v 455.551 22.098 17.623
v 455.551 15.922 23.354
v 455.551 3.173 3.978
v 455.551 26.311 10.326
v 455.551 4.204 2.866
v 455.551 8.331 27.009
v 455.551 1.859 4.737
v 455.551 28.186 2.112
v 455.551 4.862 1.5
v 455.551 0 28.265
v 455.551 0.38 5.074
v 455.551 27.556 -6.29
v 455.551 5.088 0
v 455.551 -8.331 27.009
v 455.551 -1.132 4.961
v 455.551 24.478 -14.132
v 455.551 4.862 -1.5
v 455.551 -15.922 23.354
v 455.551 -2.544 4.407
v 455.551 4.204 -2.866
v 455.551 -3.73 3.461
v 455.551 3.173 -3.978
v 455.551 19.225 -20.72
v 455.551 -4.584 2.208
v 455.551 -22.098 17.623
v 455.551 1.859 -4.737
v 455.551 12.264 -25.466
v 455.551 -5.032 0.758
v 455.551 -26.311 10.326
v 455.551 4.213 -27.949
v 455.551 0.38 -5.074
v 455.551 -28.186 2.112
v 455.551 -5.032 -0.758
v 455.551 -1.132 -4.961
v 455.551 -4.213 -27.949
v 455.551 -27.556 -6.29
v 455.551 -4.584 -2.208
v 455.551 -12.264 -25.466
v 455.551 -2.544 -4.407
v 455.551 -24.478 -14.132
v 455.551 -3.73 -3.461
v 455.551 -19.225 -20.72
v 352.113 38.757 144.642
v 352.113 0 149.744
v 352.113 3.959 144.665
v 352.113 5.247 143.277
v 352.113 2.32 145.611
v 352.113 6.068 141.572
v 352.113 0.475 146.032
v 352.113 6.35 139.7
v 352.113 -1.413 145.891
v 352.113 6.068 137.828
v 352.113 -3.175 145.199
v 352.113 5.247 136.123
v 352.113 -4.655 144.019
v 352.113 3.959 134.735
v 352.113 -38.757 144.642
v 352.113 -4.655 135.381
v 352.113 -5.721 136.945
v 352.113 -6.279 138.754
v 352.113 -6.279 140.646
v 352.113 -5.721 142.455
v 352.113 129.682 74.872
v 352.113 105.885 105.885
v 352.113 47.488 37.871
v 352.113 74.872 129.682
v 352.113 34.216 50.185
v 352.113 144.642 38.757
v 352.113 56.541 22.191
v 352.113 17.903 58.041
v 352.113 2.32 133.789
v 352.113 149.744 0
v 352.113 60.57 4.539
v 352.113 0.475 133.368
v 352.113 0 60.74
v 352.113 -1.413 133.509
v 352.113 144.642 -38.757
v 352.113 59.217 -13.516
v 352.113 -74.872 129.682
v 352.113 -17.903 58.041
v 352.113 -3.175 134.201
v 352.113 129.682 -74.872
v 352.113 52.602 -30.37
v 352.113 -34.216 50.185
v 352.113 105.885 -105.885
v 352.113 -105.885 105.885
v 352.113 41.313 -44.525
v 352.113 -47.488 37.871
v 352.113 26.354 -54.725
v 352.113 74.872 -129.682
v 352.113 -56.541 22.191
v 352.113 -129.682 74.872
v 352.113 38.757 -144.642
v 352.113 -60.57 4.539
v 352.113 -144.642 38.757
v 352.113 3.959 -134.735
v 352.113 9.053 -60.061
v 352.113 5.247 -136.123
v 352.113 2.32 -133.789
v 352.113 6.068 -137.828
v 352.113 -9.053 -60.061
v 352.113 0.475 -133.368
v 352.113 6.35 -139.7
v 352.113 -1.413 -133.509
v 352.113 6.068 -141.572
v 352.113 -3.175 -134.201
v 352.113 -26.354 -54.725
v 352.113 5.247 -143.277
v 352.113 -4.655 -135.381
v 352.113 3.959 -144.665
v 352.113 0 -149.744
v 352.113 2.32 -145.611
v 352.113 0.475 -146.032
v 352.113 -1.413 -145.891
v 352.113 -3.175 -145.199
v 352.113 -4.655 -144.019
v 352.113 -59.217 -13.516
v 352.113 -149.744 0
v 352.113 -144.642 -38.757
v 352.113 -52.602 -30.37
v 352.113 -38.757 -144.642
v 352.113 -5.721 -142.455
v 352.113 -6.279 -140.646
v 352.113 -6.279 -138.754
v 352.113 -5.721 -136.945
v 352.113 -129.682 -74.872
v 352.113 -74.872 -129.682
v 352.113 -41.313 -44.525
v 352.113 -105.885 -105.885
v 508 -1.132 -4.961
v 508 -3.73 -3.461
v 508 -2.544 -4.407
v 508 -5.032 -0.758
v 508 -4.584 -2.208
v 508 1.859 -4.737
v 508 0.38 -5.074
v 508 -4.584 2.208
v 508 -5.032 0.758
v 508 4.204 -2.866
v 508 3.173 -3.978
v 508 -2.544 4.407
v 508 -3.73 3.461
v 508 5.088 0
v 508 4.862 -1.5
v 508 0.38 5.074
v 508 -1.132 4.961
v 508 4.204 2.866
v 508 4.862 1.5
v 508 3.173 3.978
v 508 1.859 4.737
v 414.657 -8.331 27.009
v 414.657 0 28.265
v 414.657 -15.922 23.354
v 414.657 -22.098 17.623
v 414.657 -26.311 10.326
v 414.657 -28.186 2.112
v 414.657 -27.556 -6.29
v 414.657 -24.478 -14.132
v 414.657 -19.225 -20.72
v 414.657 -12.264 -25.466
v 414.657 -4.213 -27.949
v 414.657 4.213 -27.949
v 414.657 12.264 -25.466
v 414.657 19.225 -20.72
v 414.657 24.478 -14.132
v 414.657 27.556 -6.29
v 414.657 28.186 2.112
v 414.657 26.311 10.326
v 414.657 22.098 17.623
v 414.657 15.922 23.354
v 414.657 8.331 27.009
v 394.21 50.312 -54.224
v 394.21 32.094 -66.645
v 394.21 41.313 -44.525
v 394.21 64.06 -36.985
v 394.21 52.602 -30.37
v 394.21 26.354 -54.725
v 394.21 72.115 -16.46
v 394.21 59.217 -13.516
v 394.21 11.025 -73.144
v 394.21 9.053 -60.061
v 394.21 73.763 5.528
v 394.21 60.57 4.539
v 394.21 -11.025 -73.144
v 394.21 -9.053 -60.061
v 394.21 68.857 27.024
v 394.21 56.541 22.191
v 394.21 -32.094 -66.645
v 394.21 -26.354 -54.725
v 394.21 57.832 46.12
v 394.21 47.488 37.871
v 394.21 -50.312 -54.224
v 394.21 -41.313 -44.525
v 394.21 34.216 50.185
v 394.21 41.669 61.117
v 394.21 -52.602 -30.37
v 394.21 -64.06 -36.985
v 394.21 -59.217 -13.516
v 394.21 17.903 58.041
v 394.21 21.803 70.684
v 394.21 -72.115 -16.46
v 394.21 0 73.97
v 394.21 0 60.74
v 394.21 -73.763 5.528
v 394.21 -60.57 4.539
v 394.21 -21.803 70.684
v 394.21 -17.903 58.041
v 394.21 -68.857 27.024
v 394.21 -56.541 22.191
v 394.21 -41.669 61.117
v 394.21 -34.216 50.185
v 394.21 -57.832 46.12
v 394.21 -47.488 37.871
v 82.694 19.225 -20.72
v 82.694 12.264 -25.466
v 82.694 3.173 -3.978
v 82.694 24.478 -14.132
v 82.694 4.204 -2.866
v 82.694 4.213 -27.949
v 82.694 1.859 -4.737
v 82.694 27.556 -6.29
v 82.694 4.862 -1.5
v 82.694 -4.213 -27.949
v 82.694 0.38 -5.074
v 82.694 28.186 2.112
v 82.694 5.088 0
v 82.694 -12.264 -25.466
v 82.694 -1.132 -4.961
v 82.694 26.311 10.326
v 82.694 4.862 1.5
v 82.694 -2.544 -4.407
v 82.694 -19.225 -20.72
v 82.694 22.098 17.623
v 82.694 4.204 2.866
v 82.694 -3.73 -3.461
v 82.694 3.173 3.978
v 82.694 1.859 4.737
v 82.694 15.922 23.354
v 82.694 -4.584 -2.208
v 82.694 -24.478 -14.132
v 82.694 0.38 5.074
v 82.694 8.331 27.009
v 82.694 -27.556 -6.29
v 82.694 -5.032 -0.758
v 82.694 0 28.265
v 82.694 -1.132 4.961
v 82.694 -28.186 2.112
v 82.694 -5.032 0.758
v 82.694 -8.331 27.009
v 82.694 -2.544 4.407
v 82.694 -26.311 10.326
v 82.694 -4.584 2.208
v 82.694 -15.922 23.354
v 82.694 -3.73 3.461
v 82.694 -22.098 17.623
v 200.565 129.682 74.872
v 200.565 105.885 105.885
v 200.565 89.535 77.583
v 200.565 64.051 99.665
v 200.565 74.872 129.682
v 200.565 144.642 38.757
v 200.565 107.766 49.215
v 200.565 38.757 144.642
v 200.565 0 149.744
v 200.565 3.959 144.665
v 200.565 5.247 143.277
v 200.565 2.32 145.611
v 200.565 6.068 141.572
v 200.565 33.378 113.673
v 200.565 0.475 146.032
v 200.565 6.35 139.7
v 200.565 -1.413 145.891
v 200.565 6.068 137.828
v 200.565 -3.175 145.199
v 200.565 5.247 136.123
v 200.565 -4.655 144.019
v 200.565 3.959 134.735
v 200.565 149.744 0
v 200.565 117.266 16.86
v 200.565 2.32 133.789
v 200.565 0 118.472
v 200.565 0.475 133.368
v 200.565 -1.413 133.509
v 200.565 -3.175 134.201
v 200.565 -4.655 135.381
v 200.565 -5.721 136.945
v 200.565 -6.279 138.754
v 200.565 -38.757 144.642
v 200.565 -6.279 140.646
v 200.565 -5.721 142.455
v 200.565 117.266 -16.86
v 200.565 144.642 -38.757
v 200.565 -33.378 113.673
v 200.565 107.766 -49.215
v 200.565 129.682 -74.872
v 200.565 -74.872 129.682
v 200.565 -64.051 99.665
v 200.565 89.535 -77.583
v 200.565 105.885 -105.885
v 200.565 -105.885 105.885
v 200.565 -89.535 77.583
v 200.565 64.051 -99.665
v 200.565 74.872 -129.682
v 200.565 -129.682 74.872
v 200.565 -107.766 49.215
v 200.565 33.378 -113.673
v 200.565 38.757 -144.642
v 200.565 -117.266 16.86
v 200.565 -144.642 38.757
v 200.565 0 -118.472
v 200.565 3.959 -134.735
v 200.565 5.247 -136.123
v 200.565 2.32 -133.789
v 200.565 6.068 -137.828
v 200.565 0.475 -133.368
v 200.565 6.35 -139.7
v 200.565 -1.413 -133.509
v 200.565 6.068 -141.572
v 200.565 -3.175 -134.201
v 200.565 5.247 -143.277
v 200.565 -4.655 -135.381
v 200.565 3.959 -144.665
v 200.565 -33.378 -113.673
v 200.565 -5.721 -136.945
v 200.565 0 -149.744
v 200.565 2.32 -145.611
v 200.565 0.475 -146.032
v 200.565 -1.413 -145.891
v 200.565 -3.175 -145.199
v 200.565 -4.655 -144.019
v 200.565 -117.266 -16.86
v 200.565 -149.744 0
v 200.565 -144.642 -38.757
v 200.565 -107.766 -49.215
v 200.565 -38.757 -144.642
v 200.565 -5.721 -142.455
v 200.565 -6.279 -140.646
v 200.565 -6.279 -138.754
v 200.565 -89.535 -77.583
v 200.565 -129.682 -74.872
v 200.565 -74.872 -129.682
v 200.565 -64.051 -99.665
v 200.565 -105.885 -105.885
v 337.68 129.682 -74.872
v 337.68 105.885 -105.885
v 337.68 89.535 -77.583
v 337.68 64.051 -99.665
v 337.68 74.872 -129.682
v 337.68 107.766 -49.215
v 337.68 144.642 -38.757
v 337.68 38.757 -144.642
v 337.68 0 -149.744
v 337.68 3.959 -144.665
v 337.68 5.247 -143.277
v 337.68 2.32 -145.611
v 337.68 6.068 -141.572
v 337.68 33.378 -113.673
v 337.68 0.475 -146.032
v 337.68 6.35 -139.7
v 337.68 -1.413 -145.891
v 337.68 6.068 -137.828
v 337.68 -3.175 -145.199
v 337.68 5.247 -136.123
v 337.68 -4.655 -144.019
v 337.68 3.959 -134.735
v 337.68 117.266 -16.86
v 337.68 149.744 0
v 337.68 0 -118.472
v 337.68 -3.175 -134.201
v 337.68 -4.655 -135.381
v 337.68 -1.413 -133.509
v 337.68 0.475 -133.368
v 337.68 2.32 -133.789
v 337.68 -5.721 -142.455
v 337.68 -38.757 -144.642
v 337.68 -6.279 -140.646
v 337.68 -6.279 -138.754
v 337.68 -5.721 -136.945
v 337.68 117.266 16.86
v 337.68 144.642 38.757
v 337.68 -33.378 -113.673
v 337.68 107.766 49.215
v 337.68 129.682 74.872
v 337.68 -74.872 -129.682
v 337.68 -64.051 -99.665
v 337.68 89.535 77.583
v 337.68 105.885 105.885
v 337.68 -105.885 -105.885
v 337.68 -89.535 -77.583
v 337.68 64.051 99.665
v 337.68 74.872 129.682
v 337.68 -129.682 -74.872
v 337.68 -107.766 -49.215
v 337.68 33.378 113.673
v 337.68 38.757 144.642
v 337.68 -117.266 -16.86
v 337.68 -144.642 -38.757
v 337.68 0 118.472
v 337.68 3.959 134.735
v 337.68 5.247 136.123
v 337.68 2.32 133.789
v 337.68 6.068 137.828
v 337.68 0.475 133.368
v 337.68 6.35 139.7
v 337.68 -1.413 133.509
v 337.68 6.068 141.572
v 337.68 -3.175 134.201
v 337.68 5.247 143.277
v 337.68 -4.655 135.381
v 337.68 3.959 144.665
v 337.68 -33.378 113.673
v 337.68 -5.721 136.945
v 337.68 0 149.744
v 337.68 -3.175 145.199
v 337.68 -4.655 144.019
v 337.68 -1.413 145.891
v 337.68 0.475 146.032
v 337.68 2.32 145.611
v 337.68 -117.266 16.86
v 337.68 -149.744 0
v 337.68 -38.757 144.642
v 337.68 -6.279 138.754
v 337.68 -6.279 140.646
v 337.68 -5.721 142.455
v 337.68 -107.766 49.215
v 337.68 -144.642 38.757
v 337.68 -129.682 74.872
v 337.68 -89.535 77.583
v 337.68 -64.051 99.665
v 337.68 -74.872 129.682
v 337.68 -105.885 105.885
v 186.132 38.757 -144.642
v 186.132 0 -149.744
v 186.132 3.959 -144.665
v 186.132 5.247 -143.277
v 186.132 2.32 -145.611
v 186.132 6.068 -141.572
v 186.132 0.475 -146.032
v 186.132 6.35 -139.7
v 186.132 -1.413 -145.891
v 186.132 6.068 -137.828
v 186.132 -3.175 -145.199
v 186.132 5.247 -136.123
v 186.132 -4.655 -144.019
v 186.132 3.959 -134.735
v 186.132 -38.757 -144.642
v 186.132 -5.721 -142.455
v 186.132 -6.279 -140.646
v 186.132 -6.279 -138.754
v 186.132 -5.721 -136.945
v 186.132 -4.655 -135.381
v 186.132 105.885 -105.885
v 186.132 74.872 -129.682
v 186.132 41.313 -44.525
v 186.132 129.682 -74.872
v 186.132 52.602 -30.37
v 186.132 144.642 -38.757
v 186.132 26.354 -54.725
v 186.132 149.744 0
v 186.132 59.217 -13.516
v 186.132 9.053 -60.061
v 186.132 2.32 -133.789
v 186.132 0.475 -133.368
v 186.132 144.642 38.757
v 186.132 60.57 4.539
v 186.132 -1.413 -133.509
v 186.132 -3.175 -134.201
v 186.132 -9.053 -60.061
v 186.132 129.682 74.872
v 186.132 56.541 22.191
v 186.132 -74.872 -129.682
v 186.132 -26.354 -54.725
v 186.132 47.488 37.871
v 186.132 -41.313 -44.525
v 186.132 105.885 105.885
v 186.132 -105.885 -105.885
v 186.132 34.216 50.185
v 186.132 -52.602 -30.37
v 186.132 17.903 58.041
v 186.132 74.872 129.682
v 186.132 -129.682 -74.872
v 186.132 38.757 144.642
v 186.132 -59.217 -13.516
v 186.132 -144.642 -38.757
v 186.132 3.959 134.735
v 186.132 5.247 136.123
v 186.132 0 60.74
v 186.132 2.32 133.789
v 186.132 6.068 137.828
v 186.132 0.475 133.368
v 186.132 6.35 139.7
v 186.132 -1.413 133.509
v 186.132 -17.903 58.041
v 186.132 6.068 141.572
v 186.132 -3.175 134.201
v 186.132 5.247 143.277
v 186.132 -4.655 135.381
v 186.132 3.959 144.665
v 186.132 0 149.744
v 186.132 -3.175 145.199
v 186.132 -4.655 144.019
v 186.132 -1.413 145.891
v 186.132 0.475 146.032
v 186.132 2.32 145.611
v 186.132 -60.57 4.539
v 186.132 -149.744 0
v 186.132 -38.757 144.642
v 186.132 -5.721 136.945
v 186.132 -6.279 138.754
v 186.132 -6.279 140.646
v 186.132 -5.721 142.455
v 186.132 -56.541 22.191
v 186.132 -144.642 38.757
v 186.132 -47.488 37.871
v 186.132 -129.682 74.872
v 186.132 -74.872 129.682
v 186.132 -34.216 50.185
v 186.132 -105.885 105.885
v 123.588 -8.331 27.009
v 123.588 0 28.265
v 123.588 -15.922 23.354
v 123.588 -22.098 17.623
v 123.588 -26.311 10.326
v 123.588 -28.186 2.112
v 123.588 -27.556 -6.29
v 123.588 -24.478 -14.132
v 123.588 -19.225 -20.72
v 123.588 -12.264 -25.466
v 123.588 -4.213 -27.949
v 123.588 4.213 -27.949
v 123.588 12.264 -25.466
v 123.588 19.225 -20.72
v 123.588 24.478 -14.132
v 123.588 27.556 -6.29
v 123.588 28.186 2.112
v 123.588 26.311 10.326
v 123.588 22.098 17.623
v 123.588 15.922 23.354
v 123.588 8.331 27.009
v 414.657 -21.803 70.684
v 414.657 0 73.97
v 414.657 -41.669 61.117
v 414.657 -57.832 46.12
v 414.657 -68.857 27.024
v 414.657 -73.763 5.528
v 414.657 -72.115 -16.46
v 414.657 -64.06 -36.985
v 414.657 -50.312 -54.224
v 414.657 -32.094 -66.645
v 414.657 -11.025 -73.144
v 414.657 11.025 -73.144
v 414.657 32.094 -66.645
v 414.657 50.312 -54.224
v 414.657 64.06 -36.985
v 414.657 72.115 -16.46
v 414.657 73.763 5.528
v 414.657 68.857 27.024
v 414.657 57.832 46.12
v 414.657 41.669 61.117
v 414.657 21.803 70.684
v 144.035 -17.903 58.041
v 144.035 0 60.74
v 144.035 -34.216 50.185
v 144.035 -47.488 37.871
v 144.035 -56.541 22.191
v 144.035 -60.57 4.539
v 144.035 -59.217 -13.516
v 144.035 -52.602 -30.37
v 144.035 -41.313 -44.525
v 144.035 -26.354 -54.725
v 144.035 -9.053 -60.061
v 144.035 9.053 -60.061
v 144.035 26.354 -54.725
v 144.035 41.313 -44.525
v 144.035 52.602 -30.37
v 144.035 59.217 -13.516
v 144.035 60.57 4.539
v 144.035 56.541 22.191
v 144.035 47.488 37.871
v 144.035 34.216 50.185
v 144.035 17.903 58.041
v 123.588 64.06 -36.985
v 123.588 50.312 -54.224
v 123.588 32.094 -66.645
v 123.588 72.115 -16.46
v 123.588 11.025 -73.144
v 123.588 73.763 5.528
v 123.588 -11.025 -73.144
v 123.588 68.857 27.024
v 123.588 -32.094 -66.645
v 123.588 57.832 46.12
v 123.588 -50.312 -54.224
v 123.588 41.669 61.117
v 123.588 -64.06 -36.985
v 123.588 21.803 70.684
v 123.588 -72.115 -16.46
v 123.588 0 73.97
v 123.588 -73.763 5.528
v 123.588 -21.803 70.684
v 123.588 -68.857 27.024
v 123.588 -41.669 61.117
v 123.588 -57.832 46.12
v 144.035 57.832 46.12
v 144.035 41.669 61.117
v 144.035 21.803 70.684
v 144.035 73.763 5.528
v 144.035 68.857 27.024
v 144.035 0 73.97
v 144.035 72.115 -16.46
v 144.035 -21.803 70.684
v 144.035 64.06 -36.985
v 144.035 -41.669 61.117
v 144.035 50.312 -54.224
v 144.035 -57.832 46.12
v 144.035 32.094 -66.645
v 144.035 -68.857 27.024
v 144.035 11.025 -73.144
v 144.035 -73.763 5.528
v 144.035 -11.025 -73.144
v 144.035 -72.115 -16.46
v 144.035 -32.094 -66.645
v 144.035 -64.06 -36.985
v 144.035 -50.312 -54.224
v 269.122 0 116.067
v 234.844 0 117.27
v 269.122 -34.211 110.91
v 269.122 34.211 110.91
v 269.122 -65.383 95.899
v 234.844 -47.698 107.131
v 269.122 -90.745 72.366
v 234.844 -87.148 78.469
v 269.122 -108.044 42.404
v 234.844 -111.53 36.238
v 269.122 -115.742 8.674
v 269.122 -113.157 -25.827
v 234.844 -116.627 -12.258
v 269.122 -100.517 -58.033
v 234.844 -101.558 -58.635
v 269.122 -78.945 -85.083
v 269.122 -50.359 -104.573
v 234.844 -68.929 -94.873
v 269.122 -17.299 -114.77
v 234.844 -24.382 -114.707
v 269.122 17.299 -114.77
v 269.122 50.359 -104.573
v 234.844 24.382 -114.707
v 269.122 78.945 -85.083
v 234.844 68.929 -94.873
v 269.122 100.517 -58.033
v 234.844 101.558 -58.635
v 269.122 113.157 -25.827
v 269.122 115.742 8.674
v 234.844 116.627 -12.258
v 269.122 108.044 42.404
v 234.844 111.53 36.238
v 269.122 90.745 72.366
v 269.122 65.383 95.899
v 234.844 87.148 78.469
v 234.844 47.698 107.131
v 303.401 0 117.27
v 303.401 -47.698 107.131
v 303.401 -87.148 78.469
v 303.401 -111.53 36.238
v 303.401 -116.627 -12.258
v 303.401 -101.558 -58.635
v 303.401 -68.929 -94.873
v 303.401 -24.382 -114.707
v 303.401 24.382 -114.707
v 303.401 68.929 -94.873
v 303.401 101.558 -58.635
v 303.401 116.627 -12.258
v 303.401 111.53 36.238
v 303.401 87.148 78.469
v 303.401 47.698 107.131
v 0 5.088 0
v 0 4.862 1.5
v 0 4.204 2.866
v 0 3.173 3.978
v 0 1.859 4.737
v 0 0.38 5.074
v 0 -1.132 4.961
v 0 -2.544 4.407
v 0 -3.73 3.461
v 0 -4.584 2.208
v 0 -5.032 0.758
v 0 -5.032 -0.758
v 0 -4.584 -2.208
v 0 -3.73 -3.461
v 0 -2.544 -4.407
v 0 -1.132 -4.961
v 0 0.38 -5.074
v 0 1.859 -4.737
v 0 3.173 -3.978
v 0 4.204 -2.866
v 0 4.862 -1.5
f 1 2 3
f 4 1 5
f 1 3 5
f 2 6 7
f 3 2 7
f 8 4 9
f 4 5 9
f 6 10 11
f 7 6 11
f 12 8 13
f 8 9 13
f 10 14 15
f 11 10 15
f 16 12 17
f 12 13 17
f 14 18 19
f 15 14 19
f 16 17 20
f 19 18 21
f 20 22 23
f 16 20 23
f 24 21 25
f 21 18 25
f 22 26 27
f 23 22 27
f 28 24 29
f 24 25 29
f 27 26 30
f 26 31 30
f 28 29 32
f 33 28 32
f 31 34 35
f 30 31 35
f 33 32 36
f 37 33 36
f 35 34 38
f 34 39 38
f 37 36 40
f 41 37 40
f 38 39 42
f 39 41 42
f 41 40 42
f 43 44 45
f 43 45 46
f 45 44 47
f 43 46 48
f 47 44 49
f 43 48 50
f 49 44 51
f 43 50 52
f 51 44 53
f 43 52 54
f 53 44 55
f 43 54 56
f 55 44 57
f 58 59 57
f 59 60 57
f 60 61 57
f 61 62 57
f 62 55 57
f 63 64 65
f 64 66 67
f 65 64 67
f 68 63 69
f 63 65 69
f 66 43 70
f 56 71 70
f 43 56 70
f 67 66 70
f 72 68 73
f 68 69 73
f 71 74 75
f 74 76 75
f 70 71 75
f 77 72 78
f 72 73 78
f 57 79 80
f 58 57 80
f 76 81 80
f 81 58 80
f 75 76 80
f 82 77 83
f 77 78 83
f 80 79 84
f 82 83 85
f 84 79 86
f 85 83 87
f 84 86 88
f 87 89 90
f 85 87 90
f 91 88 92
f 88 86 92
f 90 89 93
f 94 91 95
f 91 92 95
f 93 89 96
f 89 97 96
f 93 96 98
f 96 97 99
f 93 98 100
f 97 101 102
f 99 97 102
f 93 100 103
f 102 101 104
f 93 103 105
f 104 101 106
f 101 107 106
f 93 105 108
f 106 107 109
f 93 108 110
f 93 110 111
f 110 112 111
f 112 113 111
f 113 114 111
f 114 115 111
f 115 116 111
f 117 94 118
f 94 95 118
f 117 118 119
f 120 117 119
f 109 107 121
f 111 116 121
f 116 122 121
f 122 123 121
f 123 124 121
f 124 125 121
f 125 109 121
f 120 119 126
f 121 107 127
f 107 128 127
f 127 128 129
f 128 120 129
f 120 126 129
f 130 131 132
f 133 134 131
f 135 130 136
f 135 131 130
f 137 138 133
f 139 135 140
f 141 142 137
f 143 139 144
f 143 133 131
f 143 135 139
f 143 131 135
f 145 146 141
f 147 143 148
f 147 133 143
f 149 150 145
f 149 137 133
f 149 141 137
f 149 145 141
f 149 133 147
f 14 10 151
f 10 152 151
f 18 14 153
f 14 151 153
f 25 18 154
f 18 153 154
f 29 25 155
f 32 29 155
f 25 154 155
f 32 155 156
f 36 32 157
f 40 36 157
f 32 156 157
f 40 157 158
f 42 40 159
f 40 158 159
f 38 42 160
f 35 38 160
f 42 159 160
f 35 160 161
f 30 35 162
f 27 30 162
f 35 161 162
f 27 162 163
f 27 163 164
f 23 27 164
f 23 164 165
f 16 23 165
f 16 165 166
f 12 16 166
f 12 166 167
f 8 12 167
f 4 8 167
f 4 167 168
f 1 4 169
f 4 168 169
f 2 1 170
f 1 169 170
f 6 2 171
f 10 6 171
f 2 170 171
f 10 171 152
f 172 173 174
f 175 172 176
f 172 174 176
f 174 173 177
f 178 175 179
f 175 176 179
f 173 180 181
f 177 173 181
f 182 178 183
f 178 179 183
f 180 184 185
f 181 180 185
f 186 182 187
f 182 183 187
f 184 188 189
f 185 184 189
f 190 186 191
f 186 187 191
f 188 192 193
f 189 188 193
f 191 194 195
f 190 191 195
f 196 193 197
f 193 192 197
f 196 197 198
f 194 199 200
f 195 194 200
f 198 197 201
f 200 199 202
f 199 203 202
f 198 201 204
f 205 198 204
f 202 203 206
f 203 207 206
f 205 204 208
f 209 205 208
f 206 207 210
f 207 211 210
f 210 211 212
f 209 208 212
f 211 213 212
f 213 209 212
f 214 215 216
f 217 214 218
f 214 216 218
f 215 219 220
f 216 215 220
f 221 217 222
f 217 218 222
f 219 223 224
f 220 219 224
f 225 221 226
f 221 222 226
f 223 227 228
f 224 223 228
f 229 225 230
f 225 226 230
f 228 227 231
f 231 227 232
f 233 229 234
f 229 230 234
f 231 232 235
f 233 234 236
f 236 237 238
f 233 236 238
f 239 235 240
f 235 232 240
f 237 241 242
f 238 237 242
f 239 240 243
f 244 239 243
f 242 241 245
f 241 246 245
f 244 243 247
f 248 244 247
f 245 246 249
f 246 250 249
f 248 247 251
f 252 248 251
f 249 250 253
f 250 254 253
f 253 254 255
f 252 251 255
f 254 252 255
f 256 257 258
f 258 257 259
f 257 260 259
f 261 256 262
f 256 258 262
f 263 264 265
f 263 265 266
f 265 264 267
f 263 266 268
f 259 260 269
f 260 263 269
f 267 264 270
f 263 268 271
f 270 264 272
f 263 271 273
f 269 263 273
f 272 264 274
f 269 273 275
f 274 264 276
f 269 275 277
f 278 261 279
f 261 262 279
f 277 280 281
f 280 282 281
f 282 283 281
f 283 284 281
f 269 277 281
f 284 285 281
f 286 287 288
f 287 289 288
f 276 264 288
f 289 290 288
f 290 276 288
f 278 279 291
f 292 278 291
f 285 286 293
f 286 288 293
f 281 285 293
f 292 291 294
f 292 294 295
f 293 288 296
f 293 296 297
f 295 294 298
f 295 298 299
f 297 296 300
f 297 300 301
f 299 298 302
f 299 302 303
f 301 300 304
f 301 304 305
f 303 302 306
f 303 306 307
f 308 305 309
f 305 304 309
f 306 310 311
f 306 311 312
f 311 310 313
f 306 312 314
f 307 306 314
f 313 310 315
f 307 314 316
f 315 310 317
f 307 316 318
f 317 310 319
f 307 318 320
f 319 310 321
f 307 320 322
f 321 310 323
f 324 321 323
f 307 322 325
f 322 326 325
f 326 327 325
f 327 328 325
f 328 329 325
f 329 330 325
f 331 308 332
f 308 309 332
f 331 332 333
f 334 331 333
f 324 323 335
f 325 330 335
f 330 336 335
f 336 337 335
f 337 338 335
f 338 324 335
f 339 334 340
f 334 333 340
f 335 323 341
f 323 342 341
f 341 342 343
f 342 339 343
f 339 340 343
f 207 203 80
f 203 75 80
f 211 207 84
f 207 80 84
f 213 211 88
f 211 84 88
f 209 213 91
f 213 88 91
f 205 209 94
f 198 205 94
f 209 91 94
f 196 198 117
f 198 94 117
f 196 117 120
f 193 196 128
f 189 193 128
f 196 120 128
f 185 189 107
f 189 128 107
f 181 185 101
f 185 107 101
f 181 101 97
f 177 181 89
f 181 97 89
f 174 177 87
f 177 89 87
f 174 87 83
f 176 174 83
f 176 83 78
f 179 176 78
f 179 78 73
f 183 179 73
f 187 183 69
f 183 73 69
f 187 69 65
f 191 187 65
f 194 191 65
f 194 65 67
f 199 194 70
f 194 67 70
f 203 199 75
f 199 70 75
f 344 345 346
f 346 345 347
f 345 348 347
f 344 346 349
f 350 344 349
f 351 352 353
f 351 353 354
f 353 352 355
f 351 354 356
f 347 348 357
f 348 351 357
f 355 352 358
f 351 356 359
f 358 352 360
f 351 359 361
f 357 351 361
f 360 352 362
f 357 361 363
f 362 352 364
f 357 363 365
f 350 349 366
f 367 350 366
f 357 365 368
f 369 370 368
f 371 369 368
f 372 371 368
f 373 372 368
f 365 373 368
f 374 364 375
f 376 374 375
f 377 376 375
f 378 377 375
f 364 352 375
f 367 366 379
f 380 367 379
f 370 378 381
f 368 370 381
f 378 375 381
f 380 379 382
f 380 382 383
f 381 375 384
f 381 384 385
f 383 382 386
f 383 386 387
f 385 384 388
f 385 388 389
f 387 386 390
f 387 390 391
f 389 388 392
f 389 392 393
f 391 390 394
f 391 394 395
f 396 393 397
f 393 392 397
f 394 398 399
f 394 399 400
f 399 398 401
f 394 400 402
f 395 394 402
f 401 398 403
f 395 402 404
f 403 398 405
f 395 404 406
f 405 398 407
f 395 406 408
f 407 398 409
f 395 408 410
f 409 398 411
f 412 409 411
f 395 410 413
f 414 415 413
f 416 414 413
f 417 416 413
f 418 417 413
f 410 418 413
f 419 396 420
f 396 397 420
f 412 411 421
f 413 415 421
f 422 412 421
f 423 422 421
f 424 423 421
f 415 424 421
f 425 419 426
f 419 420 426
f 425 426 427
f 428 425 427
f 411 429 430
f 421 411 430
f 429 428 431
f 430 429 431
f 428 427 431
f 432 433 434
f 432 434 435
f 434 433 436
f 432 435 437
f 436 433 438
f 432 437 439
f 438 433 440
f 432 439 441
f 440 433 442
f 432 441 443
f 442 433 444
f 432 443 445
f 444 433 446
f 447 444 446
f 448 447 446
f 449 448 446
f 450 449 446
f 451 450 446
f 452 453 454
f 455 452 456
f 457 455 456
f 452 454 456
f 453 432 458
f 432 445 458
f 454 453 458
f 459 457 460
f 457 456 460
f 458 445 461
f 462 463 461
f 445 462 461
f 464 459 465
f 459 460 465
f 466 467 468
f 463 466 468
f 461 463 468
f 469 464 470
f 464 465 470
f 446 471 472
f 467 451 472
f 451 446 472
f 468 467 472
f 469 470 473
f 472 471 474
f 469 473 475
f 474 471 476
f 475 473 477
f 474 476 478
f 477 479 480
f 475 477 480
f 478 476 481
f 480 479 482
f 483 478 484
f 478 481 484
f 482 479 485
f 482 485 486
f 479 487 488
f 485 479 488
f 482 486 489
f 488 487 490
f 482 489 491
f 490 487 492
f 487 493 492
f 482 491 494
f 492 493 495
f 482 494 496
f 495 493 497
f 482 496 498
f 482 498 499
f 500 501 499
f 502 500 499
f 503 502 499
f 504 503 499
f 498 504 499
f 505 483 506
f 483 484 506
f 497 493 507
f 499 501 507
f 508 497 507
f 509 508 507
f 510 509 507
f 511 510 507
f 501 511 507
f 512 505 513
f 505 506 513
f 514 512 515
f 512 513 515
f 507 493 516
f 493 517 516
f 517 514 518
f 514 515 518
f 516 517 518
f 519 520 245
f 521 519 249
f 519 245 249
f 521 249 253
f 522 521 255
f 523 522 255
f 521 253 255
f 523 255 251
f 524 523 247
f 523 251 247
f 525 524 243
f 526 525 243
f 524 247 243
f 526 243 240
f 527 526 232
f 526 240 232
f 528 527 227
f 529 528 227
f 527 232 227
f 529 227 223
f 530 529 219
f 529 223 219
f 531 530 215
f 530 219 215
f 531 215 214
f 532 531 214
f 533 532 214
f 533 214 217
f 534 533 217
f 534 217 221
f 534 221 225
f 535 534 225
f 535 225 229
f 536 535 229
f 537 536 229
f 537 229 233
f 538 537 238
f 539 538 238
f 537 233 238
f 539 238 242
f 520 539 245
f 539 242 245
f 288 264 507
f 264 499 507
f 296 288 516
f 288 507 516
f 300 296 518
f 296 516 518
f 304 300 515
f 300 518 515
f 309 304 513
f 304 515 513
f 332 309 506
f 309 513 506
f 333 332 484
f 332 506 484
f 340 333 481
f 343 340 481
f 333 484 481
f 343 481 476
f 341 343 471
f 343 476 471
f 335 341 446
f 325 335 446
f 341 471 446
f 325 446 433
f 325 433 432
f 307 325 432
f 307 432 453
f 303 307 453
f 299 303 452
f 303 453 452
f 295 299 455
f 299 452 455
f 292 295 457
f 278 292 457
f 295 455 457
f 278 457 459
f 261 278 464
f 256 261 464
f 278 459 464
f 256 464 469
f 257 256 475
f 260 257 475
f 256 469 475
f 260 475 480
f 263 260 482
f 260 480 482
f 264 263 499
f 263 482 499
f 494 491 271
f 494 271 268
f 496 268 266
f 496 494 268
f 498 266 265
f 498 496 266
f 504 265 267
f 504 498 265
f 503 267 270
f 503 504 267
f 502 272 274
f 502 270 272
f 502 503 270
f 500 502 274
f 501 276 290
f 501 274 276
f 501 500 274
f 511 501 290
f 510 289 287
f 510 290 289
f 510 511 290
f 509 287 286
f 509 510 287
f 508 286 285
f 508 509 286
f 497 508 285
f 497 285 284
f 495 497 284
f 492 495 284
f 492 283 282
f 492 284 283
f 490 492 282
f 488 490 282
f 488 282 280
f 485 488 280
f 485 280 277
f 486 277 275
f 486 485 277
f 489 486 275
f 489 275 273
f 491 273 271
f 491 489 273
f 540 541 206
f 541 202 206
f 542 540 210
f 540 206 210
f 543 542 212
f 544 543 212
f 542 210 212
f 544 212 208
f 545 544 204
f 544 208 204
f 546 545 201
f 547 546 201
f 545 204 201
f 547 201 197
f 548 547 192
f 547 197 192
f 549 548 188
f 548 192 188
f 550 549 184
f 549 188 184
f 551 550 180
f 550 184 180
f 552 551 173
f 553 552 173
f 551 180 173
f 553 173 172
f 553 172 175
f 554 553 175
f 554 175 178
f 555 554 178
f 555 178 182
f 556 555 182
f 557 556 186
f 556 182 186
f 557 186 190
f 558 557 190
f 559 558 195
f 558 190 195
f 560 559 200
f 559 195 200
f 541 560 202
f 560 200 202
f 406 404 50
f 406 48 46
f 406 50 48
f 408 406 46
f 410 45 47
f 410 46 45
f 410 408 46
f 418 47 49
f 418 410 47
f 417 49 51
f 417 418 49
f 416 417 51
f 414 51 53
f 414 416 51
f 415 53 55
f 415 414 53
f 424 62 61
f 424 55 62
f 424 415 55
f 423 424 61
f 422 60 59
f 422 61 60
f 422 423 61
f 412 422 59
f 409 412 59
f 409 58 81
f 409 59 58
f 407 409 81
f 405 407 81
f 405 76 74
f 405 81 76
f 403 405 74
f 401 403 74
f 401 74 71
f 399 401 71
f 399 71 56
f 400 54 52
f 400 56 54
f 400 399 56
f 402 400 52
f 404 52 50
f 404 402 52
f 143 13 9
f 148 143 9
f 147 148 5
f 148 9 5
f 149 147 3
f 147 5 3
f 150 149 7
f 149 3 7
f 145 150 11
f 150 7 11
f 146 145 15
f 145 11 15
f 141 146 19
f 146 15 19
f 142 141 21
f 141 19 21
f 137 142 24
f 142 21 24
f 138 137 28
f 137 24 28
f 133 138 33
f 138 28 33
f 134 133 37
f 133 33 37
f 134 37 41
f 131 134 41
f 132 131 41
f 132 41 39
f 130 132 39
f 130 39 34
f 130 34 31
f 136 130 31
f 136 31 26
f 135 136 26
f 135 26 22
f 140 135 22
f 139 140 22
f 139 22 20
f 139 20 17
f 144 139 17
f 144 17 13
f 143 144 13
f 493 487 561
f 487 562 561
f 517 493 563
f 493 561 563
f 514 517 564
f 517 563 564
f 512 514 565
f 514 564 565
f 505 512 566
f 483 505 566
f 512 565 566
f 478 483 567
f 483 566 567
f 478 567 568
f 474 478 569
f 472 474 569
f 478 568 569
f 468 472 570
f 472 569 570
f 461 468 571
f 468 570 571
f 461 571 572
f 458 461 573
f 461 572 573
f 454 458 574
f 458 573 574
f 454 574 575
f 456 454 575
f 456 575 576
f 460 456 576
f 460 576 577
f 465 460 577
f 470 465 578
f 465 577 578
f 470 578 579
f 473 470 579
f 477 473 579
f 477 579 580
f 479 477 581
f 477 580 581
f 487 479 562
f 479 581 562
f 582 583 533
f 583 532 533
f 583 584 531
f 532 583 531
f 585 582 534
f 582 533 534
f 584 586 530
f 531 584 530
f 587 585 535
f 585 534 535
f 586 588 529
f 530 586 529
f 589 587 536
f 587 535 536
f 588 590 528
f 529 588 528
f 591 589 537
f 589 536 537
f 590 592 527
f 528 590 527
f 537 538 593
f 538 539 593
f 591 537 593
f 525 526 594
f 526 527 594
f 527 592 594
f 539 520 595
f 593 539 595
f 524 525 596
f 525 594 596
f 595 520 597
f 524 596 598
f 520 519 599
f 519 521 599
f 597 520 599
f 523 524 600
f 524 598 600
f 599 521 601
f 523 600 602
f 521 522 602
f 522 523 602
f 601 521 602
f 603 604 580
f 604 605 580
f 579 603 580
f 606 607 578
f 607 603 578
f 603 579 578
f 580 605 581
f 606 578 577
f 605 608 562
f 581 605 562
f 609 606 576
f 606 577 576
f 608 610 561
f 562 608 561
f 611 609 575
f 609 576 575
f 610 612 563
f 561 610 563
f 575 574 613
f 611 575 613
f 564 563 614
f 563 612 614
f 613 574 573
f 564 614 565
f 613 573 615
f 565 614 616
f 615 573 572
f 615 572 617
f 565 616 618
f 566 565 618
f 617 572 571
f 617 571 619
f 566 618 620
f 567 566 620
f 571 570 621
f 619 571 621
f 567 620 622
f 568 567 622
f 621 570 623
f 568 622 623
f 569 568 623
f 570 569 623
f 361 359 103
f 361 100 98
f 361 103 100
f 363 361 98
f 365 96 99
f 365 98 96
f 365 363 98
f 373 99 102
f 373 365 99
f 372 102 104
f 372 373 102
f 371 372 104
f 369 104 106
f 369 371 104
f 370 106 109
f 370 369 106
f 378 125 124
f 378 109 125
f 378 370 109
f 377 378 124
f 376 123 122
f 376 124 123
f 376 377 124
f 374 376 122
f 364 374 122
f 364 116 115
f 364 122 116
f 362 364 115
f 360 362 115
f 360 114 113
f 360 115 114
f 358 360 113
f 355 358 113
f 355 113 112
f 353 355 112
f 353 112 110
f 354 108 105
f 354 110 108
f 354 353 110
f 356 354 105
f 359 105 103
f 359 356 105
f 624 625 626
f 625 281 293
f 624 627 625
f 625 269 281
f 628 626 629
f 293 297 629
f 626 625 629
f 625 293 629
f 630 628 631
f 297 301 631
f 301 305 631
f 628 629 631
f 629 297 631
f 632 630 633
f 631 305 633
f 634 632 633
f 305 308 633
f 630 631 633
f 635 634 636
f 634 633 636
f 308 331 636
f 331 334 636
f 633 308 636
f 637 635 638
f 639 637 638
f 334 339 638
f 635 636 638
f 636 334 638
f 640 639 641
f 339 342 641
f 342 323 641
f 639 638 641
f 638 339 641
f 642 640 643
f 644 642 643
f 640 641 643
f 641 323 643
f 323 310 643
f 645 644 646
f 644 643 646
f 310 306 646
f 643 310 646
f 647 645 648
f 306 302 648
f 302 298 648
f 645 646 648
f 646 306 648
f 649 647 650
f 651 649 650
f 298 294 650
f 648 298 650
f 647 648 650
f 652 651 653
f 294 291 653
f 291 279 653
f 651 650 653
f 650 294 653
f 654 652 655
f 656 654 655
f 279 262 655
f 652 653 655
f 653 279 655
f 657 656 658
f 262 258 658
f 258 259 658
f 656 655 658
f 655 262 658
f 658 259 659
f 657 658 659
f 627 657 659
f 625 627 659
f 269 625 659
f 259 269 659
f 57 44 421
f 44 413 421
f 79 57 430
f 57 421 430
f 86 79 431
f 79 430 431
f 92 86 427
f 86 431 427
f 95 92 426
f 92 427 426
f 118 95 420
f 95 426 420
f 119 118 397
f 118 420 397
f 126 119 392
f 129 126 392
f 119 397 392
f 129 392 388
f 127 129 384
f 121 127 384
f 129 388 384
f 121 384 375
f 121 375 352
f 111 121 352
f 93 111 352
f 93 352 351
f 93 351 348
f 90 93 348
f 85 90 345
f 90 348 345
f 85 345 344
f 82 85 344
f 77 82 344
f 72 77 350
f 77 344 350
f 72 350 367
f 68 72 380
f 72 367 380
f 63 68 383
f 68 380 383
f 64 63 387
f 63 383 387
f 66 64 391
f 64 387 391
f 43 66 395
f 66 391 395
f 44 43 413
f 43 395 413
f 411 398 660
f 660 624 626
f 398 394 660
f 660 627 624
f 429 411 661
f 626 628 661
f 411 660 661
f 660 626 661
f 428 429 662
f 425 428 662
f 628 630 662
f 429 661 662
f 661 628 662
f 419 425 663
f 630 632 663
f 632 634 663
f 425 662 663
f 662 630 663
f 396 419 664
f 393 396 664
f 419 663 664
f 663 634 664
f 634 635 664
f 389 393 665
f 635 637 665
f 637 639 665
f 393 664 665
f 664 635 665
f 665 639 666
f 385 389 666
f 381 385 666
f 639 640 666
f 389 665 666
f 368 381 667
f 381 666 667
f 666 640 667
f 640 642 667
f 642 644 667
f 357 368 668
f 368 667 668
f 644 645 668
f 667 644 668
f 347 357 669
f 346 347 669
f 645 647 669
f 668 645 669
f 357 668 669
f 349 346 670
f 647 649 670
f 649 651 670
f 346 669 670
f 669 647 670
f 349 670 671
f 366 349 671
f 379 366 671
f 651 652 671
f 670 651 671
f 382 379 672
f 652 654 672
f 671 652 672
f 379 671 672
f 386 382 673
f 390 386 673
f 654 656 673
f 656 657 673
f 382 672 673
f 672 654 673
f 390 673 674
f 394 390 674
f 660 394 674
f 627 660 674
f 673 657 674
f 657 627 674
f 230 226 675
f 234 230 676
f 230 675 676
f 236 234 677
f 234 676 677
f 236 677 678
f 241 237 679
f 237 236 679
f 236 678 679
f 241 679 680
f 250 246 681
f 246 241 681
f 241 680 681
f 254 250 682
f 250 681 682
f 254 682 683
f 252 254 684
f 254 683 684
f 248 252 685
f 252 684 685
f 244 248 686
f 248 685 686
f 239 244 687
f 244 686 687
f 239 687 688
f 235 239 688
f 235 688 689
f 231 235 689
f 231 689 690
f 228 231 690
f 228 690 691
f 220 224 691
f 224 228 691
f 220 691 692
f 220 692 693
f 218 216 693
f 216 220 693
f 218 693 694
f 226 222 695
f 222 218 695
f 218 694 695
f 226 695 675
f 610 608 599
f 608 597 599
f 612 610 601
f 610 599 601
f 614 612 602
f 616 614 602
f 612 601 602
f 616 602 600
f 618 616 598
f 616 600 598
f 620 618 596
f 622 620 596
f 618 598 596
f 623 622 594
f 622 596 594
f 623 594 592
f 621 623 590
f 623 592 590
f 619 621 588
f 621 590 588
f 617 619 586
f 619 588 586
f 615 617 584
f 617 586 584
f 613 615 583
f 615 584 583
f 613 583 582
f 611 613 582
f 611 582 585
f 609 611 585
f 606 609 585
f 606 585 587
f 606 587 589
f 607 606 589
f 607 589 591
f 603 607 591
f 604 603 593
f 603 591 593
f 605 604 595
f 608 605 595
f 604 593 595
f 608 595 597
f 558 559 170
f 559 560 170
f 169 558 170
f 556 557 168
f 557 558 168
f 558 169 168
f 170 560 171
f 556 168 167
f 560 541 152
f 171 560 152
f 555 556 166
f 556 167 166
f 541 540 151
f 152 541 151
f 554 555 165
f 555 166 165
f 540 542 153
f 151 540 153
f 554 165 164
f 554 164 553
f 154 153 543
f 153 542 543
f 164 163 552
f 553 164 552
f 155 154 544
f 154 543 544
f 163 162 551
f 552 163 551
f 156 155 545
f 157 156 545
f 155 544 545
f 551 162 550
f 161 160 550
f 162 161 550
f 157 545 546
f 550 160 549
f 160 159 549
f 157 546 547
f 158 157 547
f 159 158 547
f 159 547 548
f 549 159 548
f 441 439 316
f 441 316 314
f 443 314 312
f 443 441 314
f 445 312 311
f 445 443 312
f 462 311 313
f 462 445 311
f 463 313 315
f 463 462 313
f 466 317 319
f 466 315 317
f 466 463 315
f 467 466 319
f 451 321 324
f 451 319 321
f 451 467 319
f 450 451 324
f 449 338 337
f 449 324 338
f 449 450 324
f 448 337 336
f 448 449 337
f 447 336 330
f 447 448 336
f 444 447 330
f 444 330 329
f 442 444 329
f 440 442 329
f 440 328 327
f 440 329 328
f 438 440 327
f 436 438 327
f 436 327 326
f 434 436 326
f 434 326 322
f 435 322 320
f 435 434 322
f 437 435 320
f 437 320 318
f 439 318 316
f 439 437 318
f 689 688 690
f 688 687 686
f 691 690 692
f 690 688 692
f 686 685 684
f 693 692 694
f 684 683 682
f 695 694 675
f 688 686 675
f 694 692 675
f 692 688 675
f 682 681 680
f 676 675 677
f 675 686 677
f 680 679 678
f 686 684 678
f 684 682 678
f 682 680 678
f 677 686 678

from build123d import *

# Parameters (mm, degrees)
F0_R     = 5.088383
F1_DEPTH = 508
F4_R     = 6.35
F5_DEPTH = 508.001


with BuildPart() as f1:
    # F0 (on Right) → F1 (new body)
    with BuildSketch(Plane.YZ):
        Circle(F0_R)
    extrude(amount=F1_DEPTH)

    # F2 (on Front) → F3 (revolve)
    with BuildSketch(Plane.XZ):
        Polygon((82.693815, 28.264971), (82.693815, 0), (455.550849, 0), (455.550849, 28.264971), (414.656855, 28.264971), (414.656855, 73.970035), (394.209847, 73.970035), (394.209847, 60.739622), (352.113083, 60.739622), (352.113083, 149.744213), (337.679908, 149.744213), (337.679908, 118.47233), (269.122332, 116.066799), (200.564757, 118.47233), (200.564757, 149.744213), (186.131582, 149.744213), (186.131582, 60.739622), (144.034818, 60.739622), (144.034818, 73.970035), (123.58781, 73.970035), (123.58781, 28.264971), align=None)
    revolve(axis=Axis((269.122332, 0, 0), (1, 0, 0)))

    # F4 (on Right) → F5 (cut, through all)
    with BuildSketch(Plane.YZ):
        with Locations((0, 139.7)):
            Circle(F4_R)
        with Locations((0, -139.7)):
            Circle(F4_R)
    extrude(amount=F5_DEPTH, mode=Mode.SUBTRACT)


solid = f1.part
